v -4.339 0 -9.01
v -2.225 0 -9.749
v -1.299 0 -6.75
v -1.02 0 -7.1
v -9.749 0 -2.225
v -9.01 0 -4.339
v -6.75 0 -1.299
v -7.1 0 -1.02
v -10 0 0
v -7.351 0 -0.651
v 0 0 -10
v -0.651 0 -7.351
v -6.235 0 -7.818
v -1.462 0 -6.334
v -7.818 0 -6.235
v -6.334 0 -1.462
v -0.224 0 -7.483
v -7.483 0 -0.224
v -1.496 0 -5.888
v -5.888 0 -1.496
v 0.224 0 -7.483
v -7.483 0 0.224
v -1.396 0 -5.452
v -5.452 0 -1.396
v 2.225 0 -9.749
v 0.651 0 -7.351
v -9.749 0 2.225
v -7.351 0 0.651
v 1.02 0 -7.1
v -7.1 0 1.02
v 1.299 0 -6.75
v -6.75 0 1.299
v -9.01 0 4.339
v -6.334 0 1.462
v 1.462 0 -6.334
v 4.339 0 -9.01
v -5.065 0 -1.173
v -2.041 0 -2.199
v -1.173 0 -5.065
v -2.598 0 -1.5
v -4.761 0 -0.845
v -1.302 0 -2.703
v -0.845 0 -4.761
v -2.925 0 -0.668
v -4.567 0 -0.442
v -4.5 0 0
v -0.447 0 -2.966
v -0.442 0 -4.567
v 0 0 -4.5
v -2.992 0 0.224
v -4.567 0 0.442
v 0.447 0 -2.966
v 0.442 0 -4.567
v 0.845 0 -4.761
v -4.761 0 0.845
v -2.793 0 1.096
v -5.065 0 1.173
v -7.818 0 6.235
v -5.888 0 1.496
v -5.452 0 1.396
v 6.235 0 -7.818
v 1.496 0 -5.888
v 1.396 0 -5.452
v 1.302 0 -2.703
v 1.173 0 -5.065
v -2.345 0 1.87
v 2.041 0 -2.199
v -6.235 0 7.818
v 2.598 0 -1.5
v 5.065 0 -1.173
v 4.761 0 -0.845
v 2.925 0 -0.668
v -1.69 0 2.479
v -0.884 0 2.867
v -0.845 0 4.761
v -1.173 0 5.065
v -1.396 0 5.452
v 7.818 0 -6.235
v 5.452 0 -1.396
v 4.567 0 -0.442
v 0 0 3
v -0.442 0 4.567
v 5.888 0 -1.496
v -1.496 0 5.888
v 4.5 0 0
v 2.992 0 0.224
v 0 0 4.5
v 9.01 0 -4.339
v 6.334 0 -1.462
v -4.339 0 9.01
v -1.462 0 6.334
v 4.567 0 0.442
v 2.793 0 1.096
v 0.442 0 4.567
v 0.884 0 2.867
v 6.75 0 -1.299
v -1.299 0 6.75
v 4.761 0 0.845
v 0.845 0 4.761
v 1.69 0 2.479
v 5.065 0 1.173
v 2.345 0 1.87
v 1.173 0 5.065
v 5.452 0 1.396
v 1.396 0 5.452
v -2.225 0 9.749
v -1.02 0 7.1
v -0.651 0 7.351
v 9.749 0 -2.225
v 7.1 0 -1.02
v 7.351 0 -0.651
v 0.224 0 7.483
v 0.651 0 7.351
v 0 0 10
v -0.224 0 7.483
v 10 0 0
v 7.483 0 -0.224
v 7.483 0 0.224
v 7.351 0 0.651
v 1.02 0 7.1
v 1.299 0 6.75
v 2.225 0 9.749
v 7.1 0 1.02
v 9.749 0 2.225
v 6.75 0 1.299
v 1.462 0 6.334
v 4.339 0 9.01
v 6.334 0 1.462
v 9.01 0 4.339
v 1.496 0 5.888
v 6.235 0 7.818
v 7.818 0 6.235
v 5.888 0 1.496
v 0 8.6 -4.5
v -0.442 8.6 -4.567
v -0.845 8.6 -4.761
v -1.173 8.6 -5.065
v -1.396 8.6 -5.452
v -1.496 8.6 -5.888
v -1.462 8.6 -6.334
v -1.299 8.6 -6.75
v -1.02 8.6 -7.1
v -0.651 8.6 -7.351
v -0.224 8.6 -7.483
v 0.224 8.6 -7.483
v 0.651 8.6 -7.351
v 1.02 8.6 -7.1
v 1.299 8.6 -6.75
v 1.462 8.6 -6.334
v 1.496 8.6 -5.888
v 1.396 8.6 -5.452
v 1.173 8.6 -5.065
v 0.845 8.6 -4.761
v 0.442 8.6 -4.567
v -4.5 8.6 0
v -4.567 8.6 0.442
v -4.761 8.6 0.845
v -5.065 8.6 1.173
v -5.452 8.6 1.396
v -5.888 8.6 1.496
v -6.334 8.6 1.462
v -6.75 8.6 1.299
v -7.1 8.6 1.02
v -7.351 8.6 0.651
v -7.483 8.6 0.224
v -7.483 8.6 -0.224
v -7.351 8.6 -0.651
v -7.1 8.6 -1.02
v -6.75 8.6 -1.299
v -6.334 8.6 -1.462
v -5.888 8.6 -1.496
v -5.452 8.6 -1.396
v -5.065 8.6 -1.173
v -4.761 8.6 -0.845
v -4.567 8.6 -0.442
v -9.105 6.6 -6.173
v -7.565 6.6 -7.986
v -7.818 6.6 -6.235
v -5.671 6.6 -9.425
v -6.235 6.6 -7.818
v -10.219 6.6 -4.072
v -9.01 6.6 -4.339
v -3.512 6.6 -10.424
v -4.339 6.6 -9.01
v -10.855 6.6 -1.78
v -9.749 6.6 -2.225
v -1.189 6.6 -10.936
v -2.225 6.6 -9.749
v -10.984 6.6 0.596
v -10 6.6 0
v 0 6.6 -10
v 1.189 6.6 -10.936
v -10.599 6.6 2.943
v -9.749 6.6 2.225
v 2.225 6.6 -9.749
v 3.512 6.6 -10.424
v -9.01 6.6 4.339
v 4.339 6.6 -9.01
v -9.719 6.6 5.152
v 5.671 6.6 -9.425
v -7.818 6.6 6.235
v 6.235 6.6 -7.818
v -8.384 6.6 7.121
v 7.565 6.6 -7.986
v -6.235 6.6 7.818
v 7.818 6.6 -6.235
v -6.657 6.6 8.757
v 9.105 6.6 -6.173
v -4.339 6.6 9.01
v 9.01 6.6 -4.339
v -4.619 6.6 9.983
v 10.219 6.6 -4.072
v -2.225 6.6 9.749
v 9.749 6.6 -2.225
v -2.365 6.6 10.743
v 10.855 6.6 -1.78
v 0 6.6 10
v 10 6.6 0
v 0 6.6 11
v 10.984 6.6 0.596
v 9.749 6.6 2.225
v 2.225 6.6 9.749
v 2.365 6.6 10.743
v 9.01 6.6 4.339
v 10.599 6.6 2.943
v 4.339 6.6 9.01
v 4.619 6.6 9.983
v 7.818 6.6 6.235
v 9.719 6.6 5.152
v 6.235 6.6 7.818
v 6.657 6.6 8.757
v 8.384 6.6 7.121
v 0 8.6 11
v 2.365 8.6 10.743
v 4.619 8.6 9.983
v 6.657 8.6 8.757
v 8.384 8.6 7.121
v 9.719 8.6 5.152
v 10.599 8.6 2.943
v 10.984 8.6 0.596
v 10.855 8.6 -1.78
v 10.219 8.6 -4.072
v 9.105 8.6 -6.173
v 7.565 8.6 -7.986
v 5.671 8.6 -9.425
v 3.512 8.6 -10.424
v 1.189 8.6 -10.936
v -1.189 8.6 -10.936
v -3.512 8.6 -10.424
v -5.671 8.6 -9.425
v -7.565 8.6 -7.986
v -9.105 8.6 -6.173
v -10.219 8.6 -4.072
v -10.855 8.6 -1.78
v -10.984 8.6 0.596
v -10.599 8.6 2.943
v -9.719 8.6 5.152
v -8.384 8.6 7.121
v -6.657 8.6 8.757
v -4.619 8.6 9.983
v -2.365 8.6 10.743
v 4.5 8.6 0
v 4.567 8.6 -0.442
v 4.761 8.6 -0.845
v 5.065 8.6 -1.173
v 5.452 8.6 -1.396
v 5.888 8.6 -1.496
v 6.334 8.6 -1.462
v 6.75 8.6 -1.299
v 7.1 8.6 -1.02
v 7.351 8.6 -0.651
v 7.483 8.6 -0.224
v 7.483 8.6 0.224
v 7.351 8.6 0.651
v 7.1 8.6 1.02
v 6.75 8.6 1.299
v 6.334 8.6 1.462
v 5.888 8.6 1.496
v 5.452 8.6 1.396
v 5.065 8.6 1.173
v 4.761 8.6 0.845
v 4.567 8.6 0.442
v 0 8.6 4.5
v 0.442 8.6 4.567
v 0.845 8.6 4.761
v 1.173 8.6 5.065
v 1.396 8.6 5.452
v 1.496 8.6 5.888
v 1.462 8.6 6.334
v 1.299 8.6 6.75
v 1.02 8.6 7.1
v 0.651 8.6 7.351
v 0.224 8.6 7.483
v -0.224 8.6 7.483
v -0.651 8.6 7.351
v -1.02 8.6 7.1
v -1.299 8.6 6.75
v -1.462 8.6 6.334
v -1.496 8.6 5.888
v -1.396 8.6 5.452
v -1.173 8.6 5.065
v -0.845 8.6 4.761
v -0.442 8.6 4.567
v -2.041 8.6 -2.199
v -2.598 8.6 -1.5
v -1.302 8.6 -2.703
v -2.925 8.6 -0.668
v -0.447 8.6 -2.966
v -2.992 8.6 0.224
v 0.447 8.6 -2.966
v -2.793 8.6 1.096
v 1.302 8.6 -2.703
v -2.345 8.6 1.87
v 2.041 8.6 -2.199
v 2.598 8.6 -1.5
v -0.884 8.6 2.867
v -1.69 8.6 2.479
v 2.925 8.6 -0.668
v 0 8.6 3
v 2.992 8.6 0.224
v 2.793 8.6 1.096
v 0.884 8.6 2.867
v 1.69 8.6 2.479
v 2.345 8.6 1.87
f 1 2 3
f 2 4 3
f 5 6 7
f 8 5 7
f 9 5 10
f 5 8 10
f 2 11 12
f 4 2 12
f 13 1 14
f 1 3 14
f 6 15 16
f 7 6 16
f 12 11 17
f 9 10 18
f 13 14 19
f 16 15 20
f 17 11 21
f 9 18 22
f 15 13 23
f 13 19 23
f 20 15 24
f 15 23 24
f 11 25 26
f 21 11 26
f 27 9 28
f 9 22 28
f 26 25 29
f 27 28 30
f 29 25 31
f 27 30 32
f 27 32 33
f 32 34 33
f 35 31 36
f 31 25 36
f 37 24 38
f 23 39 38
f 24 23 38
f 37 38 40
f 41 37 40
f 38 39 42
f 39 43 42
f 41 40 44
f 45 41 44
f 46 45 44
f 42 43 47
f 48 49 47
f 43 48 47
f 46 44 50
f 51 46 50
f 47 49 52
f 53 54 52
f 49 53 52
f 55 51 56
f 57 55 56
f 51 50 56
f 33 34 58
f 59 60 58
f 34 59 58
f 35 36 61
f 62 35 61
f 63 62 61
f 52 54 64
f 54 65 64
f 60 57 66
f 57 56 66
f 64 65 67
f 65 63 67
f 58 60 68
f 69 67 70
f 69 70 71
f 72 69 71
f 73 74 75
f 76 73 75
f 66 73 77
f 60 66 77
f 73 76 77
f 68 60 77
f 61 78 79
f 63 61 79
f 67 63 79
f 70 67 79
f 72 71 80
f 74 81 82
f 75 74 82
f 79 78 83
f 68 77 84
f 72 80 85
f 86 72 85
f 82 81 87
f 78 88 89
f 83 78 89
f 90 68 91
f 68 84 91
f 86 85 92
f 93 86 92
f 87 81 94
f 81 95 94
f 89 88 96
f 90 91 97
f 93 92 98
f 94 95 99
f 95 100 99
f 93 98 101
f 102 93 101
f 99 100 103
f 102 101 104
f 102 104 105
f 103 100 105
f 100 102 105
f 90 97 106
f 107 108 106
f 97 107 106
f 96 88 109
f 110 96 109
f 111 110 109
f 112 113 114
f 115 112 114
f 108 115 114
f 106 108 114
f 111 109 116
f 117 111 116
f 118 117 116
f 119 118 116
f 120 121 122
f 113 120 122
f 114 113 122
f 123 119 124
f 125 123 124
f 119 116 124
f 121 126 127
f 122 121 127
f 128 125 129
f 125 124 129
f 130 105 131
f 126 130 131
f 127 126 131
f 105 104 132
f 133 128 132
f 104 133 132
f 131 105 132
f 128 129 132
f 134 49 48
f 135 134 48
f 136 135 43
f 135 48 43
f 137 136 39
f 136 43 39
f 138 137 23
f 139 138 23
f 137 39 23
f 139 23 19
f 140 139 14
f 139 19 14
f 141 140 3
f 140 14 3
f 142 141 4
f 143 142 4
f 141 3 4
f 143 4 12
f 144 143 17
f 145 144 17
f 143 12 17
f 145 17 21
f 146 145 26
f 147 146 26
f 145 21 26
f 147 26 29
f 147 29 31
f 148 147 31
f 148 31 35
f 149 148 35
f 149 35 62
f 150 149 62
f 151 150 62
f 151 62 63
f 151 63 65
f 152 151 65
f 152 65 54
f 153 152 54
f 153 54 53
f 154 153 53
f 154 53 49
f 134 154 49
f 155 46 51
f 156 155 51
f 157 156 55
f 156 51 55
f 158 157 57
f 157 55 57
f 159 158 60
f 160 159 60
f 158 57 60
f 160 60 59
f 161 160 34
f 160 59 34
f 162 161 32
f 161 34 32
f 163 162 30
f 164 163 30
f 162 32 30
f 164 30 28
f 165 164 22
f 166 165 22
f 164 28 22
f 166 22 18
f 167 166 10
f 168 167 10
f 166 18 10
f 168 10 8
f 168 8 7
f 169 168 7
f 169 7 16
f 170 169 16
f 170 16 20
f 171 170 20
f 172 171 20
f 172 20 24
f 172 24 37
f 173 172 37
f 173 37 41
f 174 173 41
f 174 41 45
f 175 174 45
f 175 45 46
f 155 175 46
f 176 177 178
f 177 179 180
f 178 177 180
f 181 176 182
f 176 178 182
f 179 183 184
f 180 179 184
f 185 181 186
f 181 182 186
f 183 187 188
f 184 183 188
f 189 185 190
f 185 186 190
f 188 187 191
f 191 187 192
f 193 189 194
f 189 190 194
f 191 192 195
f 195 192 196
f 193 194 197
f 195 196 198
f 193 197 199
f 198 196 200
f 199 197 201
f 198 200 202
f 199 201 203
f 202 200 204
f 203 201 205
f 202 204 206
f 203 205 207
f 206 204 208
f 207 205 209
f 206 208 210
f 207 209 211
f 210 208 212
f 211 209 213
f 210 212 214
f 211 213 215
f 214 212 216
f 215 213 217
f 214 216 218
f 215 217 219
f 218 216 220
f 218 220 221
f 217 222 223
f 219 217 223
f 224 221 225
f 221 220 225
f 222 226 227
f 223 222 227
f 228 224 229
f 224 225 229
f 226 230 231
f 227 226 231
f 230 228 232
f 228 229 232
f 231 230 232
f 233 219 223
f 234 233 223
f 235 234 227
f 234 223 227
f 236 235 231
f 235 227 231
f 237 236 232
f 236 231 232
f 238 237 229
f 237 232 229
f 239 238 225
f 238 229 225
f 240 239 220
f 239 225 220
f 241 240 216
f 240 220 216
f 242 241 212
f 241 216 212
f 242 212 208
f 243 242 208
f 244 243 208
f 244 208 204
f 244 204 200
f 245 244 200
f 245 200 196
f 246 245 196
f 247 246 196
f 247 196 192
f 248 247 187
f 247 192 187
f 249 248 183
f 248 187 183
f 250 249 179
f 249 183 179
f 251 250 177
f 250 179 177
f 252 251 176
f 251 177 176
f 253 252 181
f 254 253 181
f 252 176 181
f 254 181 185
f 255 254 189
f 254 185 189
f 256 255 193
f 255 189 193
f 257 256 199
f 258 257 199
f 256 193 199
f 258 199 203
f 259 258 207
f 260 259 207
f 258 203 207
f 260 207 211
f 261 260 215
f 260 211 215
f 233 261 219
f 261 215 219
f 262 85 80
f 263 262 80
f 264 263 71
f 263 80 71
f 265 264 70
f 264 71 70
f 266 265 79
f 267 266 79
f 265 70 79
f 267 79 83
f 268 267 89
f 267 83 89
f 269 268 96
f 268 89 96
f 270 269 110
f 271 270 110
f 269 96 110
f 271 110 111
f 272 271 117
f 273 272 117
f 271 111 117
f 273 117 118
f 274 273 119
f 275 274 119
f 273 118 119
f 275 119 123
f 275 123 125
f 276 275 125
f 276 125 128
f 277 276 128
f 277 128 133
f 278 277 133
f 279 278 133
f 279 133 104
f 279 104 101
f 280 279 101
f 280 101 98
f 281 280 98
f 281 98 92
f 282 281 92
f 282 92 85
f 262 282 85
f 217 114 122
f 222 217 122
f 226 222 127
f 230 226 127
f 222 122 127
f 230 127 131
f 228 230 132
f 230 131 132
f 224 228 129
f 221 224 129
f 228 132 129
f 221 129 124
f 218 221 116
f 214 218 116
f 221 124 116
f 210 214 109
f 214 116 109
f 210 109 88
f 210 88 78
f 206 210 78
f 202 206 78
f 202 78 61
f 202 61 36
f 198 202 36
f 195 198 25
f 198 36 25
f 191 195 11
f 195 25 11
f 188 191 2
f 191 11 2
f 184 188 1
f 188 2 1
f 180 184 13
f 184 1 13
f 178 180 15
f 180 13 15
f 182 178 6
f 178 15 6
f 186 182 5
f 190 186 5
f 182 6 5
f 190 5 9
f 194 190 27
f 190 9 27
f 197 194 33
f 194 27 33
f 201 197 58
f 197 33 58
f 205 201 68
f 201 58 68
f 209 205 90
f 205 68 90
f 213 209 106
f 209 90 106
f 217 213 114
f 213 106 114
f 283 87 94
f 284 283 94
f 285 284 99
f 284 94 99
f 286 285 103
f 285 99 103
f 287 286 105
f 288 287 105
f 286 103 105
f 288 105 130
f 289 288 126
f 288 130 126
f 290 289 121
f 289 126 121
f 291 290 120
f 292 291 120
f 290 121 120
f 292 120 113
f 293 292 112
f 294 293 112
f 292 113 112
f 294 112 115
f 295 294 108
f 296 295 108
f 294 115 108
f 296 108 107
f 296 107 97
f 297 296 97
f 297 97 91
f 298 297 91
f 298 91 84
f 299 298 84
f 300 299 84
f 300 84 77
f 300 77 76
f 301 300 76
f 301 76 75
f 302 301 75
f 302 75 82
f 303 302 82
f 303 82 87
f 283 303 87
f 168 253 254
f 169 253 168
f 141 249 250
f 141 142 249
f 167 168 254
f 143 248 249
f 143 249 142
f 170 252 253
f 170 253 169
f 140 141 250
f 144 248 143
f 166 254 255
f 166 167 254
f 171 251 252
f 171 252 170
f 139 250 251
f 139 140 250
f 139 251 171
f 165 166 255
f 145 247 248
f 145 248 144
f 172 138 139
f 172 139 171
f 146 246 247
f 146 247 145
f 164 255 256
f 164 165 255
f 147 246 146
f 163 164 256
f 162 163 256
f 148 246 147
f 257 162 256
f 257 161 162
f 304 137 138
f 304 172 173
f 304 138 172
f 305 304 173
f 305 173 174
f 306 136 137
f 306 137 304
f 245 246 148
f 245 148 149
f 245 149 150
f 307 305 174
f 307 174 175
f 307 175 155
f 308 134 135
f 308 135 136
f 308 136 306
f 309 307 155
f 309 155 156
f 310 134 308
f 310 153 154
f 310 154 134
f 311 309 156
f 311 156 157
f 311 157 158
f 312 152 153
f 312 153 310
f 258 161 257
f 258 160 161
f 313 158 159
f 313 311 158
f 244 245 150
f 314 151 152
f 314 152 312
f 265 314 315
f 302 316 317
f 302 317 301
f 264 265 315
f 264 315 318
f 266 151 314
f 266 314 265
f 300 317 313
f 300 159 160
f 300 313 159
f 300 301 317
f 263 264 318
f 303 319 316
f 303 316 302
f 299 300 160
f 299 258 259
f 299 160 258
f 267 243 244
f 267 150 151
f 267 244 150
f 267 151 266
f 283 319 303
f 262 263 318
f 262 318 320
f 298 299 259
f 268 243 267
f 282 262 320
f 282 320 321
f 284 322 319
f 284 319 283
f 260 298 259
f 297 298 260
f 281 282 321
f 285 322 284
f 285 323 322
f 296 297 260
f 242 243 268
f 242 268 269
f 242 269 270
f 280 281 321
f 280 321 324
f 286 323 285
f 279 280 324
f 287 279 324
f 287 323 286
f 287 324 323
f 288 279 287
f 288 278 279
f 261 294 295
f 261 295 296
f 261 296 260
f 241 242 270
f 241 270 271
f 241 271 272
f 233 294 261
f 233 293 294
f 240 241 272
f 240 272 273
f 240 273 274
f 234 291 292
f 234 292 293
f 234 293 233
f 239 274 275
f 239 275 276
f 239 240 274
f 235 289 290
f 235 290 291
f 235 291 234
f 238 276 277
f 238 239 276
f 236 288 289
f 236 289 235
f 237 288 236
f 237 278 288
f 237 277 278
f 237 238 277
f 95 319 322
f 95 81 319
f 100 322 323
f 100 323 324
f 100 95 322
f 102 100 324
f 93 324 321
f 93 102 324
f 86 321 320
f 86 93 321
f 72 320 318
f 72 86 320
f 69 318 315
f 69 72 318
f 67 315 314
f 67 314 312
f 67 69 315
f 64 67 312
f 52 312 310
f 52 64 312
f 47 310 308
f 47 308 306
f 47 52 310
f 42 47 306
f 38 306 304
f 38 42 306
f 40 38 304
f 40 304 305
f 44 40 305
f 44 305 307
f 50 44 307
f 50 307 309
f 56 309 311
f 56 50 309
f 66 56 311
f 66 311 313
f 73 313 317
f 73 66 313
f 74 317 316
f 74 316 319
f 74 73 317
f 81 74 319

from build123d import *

# Parameters (mm, degrees)
SKETCH_1_R               = 10
SKETCH_1_R_2             = 3
EXTRUDE_1_DEPTH          = 6.6
SKETCH_2_R               = 11
SKETCH_2_R_2             = 3
EXTRUDE_2_DEPTH          = 2
CUT_EXTRUDE_1_REACH      = 19.775
SKETCH_3_R               = 1.5
PATTERN_CIRCULAR_1_COUNT = 4


with BuildPart() as part:
    # 草图1 → 凸台-拉伸1 (new body)
    with BuildSketch(Plane(origin=(0, 0, 0), x_dir=(1, 0, 0), z_dir=(0, 1, 0))):
        with Locations(Location((0, 0, 0), (0, 0, 270))):
            Circle(SKETCH_1_R)
        with Locations(Location((0, 0, 0), (0, 0, 270))):
            Circle(SKETCH_1_R_2, mode=Mode.SUBTRACT)
    extrude(amount=EXTRUDE_1_DEPTH)

    # 草图2 → 凸台-拉伸2 (add)
    with BuildSketch(Plane(origin=(0, 6.6, 0), x_dir=(1, 0, 0), z_dir=(0, 1, 0))):
        with Locations(Location((0, 0, 0), (0, 0, 270))):
            Circle(SKETCH_2_R)
        with Locations(Location((0, 0, 0), (0, 0, 270))):
            Circle(SKETCH_2_R_2, mode=Mode.SUBTRACT)
    extrude(amount=EXTRUDE_2_DEPTH)

    # 草图3 → 切除-拉伸1 (cut, up to next)
    with BuildSketch(Plane.XZ, mode=Mode.PRIVATE) as cut_extrude_1_sk1:
        with Locations(Location((0, 6, 0), (0, 0, 270))):
            Circle(SKETCH_3_R)
    cut_extrude_1_tool1 = extrude(cut_extrude_1_sk1.sketch, amount=-CUT_EXTRUDE_1_REACH, mode=Mode.PRIVATE) & part.part
    cut_extrude_1 = cut_extrude_1_tool1.solids().sort_by_distance((0, 0, 6))[0]
    add(cut_extrude_1, mode=Mode.SUBTRACT)

    # 阵列(圆周)1: 切除-拉伸1 ×4 about axis
    pattern_circular_1_axis = Axis((0, 0, 0), (0, 1, 0))
    for i in range(1, PATTERN_CIRCULAR_1_COUNT):
        add(cut_extrude_1.rotate(pattern_circular_1_axis, i * 360 / PATTERN_CIRCULAR_1_COUNT), mode=Mode.SUBTRACT)


solid = part.part
